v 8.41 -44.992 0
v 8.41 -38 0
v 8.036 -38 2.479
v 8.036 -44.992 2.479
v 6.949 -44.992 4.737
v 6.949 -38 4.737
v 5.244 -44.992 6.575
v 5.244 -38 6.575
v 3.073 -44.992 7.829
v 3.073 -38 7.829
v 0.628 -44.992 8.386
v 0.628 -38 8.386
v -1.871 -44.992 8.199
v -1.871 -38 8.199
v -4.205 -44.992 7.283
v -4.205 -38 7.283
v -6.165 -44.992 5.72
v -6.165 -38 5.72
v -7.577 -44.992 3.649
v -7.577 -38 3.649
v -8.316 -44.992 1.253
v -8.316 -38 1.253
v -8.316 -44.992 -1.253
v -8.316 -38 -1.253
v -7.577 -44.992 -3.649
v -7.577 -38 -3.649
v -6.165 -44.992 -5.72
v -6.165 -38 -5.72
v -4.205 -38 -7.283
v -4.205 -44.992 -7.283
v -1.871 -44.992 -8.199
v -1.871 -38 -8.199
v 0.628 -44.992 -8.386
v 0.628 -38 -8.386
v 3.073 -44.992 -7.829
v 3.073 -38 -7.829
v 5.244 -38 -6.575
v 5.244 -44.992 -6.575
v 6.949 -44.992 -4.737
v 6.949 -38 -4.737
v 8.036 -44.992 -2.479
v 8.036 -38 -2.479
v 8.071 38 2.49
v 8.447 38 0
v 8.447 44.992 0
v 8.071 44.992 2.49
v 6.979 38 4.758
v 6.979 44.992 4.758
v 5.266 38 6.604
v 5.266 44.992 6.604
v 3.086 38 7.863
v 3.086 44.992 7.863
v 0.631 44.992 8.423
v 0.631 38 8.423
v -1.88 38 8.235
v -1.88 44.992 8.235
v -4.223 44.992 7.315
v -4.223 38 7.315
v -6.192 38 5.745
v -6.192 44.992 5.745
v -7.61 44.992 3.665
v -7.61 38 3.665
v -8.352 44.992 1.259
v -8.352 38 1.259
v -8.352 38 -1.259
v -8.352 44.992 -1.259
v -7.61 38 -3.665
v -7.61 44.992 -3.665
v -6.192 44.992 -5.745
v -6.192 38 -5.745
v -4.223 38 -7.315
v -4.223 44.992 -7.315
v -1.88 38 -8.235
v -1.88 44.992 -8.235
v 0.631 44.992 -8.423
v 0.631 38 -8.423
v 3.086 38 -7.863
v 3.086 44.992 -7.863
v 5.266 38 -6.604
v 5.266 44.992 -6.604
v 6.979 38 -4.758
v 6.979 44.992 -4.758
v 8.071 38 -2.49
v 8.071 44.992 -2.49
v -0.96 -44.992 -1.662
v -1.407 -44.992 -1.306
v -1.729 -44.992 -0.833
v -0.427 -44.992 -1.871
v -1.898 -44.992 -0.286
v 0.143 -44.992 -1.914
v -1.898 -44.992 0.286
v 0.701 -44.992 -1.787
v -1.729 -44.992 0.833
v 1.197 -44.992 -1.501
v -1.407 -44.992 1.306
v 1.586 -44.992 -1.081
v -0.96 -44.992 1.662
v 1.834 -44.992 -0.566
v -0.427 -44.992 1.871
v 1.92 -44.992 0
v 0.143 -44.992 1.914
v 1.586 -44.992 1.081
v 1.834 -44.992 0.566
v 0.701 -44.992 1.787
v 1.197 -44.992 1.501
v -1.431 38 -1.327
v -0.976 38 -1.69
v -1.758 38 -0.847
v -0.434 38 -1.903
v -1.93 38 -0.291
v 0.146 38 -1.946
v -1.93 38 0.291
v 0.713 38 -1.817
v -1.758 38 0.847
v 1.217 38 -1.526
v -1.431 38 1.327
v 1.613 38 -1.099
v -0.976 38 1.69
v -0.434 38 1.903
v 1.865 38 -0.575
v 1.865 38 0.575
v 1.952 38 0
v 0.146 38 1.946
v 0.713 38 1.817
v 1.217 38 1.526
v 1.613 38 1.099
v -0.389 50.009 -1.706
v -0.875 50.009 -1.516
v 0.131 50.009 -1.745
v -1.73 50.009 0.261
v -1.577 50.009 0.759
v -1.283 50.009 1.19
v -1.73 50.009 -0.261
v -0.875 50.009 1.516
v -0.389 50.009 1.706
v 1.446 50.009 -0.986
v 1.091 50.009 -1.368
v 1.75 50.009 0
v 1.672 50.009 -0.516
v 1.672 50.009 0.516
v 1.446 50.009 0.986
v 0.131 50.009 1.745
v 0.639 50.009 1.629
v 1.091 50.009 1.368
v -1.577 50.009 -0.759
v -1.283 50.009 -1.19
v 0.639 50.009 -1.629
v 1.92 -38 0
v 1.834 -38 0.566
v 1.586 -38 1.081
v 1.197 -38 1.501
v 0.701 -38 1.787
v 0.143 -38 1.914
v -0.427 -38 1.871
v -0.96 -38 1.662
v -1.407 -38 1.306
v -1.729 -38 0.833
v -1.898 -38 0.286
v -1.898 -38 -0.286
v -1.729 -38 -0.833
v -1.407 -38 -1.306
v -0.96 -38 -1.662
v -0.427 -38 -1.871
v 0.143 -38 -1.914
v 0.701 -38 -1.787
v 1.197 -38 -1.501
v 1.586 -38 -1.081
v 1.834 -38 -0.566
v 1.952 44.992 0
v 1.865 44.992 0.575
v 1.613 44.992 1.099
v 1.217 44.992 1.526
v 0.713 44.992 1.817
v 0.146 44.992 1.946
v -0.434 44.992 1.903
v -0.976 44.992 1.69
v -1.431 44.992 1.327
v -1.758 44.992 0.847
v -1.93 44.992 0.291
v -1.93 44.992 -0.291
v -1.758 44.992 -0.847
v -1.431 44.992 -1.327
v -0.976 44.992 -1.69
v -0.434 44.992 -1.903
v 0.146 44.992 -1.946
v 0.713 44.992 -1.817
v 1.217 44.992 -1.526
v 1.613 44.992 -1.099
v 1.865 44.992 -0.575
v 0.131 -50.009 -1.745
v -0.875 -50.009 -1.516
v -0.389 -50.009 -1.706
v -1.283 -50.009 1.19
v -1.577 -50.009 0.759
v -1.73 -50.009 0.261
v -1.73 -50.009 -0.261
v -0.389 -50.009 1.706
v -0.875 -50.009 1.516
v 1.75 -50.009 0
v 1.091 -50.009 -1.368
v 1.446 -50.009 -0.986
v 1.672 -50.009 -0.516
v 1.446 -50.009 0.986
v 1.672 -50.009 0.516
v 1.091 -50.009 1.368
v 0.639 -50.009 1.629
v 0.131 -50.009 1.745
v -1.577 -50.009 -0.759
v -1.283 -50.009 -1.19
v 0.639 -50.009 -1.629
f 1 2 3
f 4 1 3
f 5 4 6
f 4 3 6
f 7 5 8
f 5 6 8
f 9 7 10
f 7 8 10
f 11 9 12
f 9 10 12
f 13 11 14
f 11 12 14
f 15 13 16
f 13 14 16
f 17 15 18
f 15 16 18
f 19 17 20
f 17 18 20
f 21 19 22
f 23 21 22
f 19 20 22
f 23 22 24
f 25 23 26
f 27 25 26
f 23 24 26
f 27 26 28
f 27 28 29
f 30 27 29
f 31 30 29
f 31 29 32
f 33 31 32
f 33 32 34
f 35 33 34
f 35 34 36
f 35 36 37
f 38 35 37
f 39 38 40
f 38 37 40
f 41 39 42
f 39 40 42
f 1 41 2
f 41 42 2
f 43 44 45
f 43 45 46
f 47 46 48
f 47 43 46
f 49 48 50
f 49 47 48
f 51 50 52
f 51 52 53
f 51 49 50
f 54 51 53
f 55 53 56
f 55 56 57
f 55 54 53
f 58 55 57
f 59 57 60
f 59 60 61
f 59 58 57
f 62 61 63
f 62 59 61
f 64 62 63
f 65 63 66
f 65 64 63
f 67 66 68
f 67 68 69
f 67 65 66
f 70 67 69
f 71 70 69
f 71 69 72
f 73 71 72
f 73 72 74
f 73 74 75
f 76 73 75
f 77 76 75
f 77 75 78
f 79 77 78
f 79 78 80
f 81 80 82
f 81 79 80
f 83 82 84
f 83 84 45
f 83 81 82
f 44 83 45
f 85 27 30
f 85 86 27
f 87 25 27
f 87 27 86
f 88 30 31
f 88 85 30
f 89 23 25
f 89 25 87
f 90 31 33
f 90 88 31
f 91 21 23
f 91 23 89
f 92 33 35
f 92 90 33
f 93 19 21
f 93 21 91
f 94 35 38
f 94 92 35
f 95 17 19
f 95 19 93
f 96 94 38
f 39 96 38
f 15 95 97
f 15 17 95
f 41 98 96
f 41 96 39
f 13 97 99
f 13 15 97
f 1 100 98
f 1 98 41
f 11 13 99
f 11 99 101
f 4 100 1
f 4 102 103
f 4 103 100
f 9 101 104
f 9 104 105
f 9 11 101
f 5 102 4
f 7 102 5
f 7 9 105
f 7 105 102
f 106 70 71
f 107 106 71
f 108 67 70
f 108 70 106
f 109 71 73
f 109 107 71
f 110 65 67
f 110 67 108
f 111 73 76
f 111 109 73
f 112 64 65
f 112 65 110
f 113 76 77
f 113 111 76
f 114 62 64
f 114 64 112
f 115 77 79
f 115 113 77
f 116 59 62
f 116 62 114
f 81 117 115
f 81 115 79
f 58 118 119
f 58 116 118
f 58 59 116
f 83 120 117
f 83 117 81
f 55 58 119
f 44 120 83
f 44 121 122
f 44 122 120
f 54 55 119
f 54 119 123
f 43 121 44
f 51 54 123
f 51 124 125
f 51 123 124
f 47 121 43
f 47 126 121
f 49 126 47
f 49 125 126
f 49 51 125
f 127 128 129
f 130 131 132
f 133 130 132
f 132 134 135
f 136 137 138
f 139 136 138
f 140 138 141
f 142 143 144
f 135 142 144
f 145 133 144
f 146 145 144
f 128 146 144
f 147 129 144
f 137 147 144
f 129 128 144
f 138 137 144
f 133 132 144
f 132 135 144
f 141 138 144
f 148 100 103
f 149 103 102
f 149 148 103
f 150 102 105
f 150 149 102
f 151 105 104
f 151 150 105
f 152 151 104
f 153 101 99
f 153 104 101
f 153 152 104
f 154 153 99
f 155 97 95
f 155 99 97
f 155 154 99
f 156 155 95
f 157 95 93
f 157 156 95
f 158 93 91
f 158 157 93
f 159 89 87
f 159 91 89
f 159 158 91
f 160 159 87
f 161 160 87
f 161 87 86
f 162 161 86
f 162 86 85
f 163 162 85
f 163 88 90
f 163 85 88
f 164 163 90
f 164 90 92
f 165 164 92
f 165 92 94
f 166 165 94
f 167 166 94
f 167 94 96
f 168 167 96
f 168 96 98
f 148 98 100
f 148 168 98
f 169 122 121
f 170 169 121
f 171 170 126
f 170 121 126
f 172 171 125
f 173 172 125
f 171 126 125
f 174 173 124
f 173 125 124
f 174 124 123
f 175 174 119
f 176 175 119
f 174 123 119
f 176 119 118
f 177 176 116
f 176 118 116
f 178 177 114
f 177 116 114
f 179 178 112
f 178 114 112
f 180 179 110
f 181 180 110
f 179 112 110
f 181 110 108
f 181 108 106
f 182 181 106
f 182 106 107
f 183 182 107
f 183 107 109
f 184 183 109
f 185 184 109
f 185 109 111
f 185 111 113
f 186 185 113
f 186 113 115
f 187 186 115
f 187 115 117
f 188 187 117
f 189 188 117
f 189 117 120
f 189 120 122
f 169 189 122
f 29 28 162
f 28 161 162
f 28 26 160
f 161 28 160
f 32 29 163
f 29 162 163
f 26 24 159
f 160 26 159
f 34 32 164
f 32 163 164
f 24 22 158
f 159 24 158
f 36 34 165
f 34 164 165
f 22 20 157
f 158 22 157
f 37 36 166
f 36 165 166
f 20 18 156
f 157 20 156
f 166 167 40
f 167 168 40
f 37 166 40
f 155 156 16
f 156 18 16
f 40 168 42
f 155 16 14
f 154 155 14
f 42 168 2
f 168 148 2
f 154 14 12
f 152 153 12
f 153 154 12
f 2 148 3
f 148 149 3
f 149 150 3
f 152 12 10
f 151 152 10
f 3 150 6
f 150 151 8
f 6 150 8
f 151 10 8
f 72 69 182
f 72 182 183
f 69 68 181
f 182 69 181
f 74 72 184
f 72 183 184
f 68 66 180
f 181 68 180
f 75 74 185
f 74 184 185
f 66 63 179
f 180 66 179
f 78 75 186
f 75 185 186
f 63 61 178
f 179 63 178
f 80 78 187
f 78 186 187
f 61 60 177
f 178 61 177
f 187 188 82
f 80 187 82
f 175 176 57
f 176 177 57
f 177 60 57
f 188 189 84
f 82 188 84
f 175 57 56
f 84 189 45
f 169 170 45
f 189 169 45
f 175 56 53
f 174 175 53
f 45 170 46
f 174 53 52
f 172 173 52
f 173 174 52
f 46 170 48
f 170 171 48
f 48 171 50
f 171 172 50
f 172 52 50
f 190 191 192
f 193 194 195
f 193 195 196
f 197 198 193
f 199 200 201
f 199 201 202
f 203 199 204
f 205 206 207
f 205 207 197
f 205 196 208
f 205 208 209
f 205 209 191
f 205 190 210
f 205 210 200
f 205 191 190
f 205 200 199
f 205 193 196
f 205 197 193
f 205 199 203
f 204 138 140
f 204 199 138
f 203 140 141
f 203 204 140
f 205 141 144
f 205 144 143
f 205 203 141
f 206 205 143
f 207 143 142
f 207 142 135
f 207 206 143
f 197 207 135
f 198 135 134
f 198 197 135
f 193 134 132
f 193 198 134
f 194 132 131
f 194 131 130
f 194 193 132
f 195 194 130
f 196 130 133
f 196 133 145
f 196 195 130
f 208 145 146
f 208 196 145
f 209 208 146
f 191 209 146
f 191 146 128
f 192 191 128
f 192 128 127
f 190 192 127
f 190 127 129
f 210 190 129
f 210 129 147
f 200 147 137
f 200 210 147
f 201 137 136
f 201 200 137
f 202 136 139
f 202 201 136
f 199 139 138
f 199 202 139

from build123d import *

# Parameters (mm, degrees)
F2_R      = 8.4099565343
F4_DEPTH  = 6.99204
F3_R      = 1.919597314
F5_DEPTH  = 7.58419
F6_R      = 1.75
F7_DEPTH  = 50.00907
F8_R      = 8.4466451415
F10_DEPTH = 6.992
F9_R      = 1.9516228475
F11_DEPTH = 10.0613
F12_DEPTH = 50.009


# Not quite as in the source:
# - a feature names something its author has since deleted; it is built from what else it names


with BuildPart() as f4:
    # F2 (on offset) → F4 (new body)
    with BuildSketch(Plane.XZ.offset(38)):
        Circle(F2_R)
    extrude(amount=F4_DEPTH)

    # F3 (on offset) → F5 (cut)
    with BuildSketch(Plane.XZ.offset(38)):
        Circle(F3_R)
    extrude(amount=F5_DEPTH, mode=Mode.SUBTRACT)


with BuildPart() as f7:
    # F6 (on Front) → F7 (new body)
    with BuildSketch(Plane.XZ):
        Circle(F6_R)
    extrude(amount=F7_DEPTH)

    # F6 (on Front) → F12 (join)
    with BuildSketch(Plane.XZ):
        Circle(F6_R)
    extrude(amount=-F12_DEPTH)


with BuildPart() as f10:
    # F8 (on offset) → F10 (new body)
    with BuildSketch(Plane.XZ.offset(-38)):
        Circle(F8_R)
    extrude(amount=-F10_DEPTH)

    # F9 (on offset) → F11 (cut)
    with BuildSketch(Plane.XZ.offset(-38)):
        Circle(F9_R)
    extrude(amount=-F11_DEPTH, mode=Mode.SUBTRACT)


solid = Compound([f4.part, f7.part, f10.part])
